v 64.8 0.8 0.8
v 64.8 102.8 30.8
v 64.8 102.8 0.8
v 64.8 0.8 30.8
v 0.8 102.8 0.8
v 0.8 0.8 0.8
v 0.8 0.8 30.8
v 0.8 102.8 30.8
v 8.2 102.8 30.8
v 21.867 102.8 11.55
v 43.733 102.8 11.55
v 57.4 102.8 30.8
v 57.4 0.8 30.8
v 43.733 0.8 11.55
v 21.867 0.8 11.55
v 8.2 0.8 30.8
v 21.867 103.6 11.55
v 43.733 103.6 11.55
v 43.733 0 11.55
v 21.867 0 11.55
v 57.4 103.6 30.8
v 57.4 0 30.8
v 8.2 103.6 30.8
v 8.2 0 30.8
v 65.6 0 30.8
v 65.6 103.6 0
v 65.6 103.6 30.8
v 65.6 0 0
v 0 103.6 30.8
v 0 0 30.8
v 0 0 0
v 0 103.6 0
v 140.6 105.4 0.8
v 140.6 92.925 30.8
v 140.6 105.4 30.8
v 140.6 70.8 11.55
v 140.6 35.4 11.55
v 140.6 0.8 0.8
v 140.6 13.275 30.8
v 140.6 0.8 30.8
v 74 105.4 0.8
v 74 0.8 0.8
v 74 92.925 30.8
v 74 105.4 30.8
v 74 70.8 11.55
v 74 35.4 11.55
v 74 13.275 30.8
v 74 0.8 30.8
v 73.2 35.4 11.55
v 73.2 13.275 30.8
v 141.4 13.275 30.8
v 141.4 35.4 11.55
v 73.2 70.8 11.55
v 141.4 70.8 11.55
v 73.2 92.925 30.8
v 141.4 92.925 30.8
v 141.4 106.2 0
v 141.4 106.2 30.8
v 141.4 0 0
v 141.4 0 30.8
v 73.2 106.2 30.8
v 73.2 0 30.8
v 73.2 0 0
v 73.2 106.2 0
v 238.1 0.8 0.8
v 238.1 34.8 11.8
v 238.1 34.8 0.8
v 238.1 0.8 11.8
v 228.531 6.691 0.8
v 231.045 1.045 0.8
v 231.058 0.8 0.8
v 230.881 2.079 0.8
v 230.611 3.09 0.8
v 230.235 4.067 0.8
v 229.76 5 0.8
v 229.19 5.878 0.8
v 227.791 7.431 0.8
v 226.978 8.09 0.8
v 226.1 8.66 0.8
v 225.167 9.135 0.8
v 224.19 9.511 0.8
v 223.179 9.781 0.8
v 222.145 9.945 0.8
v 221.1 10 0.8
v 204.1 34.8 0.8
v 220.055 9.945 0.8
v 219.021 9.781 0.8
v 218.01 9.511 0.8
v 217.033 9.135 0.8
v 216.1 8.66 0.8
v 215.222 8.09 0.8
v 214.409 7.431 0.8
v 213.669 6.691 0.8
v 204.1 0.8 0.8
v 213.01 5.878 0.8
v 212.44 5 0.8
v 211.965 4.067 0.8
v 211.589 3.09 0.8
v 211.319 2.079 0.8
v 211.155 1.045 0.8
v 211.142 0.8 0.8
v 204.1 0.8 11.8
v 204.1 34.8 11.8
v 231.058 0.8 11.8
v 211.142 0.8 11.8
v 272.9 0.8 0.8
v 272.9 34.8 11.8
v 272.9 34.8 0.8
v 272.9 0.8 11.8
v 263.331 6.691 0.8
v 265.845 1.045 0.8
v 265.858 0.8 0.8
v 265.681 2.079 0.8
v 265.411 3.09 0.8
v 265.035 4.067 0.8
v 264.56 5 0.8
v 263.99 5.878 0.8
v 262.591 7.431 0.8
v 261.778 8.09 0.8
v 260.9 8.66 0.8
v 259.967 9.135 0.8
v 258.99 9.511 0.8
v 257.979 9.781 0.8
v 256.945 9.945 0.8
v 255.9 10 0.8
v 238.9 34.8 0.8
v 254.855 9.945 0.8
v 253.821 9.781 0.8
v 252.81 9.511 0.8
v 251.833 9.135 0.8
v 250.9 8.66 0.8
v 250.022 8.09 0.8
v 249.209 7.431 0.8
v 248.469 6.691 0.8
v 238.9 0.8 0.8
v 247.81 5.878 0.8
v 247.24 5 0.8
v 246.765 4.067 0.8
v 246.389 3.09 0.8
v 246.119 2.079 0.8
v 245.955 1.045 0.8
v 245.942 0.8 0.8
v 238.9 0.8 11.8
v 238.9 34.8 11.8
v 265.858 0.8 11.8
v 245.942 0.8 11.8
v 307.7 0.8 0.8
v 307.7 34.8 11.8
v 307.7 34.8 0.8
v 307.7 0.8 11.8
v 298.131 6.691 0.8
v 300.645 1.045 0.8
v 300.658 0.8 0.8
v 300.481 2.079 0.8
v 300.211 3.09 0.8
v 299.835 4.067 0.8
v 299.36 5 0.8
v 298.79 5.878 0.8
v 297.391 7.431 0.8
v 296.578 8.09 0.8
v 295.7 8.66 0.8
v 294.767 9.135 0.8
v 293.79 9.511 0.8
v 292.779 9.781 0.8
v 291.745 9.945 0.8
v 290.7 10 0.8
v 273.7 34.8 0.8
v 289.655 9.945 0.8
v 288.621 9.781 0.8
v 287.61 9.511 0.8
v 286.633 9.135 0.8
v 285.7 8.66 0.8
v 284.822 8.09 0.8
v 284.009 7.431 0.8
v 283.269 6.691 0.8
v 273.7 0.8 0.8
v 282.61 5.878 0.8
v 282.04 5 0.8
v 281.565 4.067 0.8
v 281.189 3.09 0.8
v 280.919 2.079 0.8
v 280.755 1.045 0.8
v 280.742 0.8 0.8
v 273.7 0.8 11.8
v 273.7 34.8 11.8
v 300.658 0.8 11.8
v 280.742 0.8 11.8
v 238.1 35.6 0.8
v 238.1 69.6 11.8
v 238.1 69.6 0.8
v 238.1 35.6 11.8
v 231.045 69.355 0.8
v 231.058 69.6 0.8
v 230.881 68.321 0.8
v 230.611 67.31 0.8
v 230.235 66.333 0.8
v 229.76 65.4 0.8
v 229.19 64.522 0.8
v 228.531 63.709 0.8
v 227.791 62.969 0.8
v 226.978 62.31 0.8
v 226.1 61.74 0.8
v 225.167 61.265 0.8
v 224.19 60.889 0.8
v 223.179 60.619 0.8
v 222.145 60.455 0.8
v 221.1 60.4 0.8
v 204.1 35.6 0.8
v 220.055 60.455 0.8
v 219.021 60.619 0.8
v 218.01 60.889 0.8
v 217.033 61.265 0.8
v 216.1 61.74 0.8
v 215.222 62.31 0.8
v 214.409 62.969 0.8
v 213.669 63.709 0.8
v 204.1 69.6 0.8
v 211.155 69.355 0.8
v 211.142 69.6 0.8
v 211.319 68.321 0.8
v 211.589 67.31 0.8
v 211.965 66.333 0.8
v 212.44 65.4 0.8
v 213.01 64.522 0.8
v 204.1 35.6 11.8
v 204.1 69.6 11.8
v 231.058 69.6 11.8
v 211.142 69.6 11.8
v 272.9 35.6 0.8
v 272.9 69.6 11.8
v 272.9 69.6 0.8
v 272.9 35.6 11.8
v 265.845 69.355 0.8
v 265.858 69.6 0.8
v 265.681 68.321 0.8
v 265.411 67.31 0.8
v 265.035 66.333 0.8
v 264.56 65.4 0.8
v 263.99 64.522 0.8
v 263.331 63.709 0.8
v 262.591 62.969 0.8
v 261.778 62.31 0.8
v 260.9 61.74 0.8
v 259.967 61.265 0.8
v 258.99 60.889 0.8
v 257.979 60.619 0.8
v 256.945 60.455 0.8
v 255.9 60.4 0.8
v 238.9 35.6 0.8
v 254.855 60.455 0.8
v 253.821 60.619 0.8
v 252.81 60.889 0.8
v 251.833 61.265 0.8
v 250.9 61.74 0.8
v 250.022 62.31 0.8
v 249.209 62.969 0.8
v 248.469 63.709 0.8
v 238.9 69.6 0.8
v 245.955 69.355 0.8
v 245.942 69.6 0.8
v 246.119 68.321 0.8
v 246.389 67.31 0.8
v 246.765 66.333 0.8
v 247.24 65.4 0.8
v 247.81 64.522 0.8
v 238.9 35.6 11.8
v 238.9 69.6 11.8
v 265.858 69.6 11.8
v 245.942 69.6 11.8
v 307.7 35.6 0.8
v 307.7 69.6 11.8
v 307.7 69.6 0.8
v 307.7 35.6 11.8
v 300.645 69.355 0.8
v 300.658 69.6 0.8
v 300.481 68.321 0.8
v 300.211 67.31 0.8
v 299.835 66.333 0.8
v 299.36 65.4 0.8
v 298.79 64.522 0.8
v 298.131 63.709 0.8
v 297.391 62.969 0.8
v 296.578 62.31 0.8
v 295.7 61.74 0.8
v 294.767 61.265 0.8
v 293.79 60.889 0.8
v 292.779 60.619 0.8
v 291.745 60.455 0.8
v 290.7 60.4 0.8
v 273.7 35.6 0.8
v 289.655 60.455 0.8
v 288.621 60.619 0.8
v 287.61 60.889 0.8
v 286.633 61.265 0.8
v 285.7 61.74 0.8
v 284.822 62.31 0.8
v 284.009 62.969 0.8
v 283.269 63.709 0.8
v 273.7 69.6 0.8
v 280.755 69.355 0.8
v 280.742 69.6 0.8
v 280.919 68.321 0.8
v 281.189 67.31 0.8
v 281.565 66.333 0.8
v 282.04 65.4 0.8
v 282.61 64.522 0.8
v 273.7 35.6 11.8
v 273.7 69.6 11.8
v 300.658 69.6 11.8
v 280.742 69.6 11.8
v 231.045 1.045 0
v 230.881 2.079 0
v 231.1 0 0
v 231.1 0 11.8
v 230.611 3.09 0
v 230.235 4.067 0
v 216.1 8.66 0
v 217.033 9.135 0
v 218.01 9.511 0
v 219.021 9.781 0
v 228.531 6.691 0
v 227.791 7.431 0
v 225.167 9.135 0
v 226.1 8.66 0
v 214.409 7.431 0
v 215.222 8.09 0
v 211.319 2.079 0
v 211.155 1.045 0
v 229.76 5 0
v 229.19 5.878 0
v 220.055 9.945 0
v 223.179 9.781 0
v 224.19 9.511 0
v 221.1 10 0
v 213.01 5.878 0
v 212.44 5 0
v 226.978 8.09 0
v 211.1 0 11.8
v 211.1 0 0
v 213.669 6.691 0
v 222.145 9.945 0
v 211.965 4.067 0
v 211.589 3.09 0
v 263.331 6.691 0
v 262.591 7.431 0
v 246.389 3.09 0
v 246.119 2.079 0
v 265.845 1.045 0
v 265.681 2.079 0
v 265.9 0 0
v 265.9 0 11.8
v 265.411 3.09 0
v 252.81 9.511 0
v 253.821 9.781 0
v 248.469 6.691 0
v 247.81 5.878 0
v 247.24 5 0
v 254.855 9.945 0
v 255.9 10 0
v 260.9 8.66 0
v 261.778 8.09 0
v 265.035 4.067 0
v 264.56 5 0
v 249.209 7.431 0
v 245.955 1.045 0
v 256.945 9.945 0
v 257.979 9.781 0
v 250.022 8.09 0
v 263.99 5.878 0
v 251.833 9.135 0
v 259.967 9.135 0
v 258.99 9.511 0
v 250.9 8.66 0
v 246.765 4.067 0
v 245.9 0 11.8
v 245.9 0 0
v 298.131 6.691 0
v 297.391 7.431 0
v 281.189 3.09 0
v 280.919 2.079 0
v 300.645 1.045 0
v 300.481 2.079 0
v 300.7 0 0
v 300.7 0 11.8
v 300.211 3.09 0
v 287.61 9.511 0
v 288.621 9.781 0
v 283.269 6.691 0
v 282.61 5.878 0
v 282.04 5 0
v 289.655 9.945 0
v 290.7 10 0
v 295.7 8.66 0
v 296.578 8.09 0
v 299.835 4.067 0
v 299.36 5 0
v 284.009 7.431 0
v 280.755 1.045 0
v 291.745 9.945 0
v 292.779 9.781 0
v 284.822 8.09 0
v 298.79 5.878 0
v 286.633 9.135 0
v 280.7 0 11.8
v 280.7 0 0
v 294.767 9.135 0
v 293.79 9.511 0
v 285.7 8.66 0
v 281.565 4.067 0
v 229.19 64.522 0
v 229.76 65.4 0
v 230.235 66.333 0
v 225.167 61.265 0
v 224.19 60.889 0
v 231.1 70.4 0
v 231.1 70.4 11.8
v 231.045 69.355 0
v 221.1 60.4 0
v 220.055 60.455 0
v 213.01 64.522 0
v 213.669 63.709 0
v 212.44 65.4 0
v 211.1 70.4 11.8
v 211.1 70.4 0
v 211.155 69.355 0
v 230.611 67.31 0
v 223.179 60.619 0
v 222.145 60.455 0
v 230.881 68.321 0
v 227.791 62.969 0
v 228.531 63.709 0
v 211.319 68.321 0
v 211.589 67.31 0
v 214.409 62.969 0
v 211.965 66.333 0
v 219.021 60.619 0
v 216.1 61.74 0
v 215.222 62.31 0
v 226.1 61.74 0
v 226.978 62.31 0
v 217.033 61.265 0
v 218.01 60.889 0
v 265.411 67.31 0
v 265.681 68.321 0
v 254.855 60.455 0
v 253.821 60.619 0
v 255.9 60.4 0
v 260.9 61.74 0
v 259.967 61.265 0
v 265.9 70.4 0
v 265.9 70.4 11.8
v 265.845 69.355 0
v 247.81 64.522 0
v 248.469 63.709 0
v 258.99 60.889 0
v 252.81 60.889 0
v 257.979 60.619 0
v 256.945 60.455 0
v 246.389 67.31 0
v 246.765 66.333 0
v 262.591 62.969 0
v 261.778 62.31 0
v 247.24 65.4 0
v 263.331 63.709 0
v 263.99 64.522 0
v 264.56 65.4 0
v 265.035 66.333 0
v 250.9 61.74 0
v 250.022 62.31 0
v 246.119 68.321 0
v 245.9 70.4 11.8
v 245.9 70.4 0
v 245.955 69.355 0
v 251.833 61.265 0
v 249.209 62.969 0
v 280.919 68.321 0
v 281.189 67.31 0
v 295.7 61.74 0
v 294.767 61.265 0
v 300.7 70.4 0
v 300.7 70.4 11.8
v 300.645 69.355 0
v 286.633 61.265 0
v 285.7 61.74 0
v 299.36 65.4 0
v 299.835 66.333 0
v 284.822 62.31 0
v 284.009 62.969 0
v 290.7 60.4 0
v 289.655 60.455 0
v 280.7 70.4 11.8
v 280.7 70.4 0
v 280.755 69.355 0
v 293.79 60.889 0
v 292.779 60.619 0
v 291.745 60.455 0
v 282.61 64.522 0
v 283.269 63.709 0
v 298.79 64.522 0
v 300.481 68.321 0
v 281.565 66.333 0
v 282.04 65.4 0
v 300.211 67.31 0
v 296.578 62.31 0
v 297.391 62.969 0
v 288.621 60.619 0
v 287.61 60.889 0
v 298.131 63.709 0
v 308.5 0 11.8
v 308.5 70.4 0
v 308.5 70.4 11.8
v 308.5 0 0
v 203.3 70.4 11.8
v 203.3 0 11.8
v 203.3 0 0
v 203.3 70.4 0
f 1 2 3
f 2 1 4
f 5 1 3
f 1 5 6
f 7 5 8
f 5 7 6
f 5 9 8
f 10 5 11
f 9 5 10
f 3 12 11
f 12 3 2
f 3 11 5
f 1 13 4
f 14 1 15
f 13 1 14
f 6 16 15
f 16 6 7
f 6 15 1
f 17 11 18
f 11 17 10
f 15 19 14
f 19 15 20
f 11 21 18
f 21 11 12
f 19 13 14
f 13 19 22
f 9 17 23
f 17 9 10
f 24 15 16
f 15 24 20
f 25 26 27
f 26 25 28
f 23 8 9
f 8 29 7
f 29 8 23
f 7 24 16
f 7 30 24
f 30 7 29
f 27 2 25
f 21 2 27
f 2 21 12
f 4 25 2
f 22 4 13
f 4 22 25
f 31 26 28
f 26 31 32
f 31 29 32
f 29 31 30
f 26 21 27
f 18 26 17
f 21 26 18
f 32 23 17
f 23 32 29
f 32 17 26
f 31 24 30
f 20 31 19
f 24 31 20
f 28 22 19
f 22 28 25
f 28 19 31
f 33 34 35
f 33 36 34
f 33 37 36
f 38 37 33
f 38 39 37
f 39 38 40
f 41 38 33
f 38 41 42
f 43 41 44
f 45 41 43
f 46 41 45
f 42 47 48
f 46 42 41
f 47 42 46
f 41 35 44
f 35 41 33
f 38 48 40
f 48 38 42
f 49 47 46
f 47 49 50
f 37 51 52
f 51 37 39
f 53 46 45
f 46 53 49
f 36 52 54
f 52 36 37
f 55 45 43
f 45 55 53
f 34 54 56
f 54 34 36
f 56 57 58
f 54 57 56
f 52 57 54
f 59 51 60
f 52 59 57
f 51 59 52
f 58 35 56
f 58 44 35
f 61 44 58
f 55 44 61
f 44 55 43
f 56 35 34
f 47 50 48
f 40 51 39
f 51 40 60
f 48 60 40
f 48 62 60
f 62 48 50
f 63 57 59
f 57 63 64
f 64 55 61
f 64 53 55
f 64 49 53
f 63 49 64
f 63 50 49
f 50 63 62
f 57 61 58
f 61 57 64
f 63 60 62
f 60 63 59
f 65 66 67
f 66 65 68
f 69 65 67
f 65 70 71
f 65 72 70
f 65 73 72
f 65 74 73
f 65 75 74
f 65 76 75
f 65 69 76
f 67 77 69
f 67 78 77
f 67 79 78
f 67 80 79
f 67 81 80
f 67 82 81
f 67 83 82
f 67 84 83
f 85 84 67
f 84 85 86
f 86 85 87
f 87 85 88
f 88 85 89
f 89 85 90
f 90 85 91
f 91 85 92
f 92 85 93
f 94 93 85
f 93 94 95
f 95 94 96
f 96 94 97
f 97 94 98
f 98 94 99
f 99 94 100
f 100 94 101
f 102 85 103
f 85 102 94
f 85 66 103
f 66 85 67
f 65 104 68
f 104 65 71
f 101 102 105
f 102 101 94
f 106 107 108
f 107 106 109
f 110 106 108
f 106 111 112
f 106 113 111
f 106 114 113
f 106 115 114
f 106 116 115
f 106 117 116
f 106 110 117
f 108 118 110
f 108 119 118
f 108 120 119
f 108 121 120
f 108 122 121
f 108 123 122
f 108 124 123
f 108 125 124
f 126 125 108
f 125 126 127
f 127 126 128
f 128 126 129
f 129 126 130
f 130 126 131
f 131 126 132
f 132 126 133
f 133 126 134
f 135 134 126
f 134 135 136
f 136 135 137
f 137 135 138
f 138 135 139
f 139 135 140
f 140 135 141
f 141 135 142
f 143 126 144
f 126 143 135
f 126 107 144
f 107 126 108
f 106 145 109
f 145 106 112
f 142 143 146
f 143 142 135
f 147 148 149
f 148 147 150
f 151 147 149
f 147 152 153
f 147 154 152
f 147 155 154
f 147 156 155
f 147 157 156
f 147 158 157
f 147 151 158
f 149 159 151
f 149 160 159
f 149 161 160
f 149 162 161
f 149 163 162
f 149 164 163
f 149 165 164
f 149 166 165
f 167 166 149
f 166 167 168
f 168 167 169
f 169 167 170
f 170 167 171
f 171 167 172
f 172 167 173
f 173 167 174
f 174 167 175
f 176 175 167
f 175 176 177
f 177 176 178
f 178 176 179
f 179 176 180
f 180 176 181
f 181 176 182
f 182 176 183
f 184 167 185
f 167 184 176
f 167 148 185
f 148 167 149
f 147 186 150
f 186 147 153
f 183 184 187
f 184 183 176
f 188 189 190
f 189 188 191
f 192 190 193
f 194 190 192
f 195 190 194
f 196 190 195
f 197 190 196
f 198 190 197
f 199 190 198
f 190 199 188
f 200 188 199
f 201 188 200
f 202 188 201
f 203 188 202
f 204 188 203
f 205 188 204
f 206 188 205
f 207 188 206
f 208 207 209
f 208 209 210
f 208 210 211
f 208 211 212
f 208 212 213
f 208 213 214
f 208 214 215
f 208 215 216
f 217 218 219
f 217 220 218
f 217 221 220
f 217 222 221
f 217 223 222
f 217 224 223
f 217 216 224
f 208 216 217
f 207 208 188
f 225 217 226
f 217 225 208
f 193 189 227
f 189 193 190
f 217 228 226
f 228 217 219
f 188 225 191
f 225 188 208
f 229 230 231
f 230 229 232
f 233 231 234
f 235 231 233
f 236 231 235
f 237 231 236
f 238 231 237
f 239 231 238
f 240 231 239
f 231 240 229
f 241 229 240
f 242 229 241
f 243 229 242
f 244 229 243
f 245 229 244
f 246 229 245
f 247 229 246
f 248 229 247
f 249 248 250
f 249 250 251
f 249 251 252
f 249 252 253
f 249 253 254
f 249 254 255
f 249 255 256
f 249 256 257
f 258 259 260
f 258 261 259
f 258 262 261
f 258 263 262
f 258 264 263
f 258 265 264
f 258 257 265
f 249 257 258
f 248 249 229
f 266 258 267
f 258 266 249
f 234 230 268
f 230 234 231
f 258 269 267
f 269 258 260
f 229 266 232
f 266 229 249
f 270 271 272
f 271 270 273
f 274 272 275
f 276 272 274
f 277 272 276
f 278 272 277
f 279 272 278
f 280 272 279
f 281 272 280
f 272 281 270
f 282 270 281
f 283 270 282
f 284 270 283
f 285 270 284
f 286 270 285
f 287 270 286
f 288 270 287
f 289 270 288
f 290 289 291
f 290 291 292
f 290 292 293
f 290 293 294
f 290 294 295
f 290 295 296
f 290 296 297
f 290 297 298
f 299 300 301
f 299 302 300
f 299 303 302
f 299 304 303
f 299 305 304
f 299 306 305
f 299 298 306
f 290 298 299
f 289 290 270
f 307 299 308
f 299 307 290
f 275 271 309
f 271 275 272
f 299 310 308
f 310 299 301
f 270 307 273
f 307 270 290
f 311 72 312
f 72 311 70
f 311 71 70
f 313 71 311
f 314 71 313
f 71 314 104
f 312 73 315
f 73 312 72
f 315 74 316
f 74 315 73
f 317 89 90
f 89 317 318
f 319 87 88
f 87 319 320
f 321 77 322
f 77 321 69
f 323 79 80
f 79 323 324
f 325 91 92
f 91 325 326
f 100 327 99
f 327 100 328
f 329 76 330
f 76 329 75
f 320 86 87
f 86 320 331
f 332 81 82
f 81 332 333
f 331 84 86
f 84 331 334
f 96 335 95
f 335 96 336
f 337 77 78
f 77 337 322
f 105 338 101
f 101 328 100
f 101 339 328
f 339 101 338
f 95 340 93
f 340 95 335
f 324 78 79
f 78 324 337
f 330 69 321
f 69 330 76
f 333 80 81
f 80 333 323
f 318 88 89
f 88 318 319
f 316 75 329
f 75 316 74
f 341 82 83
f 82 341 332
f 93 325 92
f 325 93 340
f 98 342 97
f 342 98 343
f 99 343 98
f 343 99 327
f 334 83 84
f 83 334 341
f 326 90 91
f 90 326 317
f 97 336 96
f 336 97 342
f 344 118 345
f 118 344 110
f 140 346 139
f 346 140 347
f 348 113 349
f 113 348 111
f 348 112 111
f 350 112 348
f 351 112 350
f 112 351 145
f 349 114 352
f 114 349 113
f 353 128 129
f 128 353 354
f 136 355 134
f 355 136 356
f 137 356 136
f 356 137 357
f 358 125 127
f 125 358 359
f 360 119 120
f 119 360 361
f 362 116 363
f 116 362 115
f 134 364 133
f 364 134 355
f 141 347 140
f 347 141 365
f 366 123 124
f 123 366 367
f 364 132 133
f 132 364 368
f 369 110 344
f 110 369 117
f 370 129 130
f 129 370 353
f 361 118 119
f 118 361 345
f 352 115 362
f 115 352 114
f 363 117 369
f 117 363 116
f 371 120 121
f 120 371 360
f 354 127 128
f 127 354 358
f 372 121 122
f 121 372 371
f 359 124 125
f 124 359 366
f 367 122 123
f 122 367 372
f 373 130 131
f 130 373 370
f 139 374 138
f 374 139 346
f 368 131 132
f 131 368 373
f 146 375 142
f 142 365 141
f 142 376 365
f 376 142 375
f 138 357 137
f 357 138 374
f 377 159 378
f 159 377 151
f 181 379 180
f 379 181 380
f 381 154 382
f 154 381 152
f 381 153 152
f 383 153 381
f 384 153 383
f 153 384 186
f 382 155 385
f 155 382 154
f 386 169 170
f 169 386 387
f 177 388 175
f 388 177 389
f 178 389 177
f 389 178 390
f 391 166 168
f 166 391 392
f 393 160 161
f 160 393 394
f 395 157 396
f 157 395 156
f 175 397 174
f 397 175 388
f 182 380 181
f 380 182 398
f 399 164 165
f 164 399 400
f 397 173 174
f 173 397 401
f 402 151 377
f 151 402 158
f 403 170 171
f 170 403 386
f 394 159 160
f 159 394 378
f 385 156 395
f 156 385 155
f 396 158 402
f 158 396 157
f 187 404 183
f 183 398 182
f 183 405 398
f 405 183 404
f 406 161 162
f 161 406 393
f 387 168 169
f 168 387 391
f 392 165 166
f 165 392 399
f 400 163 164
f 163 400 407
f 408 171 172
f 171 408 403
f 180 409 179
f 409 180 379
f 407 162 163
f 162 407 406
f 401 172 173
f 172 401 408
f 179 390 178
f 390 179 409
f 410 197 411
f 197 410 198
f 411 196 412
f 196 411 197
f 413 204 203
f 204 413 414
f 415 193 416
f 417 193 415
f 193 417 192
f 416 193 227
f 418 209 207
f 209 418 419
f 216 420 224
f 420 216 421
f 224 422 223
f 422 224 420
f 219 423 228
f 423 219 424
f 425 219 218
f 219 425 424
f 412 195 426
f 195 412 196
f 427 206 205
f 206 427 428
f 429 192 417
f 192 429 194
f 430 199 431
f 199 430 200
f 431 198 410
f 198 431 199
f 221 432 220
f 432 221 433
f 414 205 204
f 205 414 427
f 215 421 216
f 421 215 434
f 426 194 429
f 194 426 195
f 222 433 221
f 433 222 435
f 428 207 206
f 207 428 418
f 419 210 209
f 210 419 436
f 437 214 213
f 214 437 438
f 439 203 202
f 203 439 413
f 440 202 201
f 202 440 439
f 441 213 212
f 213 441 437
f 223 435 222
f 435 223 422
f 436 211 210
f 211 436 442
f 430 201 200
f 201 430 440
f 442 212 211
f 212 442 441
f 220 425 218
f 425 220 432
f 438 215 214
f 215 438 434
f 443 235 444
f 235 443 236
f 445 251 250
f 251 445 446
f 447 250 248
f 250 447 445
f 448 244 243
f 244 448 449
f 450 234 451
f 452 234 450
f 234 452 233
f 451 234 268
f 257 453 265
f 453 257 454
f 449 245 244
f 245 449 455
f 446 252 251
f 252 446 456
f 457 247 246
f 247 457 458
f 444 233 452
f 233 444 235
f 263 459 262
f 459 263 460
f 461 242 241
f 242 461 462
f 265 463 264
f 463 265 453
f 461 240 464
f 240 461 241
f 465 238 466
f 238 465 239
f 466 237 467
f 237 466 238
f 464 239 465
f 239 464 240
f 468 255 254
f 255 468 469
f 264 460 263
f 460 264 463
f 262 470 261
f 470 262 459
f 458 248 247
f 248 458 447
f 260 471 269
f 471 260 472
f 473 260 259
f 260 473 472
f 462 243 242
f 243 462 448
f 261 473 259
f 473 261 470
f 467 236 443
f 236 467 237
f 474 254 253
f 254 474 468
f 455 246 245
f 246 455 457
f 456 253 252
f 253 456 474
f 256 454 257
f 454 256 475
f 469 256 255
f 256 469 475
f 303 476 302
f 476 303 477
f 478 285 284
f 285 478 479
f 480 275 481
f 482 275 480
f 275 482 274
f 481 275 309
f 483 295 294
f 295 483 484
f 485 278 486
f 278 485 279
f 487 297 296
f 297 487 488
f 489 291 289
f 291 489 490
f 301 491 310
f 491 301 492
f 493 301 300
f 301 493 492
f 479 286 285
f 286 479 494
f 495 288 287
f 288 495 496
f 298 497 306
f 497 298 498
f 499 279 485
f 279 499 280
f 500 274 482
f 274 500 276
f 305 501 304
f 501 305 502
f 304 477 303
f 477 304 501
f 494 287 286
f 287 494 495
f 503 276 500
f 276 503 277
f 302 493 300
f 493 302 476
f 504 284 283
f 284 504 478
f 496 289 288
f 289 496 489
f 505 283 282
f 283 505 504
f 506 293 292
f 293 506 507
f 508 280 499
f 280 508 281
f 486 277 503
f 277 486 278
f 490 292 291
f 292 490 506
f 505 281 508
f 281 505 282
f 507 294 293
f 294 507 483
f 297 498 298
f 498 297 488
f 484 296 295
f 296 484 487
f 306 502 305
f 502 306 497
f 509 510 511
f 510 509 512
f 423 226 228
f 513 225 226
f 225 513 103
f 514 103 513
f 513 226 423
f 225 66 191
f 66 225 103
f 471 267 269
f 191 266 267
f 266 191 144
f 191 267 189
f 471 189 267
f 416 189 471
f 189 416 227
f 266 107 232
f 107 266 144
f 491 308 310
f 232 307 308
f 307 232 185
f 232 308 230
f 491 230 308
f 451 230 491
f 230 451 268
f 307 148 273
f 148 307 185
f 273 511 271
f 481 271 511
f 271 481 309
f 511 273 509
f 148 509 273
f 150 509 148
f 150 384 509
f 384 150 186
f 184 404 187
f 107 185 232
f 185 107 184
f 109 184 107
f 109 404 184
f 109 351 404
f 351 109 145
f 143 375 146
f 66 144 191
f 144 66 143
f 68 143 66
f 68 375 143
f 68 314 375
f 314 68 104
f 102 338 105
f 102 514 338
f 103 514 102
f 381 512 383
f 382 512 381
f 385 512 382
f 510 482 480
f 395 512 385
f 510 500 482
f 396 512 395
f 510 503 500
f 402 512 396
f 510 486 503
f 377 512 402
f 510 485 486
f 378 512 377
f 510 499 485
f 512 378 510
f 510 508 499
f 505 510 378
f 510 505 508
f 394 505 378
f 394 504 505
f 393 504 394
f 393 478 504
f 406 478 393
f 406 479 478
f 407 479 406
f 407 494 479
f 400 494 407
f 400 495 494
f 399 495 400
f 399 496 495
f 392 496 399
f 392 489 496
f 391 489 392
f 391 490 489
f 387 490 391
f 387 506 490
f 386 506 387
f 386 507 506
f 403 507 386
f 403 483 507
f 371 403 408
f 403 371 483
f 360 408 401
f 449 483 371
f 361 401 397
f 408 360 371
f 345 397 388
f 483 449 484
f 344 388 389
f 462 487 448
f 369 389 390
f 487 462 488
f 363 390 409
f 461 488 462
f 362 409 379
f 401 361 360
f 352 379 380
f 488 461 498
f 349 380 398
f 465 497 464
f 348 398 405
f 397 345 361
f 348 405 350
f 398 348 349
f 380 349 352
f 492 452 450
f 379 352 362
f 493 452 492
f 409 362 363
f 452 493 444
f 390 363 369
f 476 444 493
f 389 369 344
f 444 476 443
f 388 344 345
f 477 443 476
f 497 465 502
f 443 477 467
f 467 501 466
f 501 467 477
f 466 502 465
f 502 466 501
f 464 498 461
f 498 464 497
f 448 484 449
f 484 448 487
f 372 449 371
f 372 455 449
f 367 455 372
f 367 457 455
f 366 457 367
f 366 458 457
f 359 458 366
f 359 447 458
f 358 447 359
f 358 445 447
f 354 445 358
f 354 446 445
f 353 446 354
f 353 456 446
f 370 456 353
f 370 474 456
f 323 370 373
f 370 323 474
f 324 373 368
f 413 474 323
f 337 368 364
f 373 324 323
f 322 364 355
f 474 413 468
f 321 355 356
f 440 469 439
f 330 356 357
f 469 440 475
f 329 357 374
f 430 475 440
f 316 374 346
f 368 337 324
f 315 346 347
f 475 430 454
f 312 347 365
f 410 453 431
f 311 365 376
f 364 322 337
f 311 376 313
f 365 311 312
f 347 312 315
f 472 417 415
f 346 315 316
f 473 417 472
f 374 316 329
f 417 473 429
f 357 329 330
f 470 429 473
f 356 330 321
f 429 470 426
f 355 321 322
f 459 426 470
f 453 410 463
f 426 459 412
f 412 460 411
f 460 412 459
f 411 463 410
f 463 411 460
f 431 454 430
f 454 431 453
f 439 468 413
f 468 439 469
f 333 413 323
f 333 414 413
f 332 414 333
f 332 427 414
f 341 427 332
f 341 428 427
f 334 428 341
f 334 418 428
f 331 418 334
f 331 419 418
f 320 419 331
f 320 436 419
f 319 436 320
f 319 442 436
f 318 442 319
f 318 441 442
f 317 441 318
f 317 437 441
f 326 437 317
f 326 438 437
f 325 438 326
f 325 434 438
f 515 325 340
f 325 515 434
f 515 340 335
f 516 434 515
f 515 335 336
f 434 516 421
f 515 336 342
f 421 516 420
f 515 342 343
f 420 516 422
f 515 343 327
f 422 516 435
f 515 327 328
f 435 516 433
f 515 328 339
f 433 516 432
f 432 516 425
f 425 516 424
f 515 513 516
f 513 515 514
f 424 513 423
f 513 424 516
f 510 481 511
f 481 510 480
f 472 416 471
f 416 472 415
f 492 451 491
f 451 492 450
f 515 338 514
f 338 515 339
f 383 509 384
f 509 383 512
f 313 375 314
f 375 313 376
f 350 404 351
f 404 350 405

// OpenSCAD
// Maximim card width (default 64)
card_size_x = 64;

// Maximum card lenght (default 102)
card_size_y = 102;

// Maximum internal height (default 30)
height = 30;

// Thickness of the walls (default 1.75)
wall_thickness = 0.8;

// Separation between upper and lower (default 0.5)
tolerance = 0.5;

/* {{{ %%SECTION_HEADER%%
 * * * *
 * This header information is automatically generated by KodeUtils.
 *
 * File 'tarjetero.scad' edited by kwendenarmo, last modified: 2017-04-15.
 * This file is part of 'tarjetero' package, please see the readme files for more information about this file and this package.
 *
 * Copyright (C) 2017 by kwendenarmo <kwendenarmo@akornsys-rdi.net>
 * Released under the GNU GPLv3
 *
 *    This program is free software: you can redistribute it and/or modify
 *    it under the terms of the GNU General Public License as published by
 *    the Free Software Foundation, either version 3 of the License, or
 *    (at your option) any later version.
 *
 *    This program is distributed in the hope that it will be useful,
 *    but WITHOUT ANY WARRANTY; without even the implied warranty of
 *    MERCHANTABILITY or FITNESS FOR A PARTICULAR PURPOSE.  See the
 *    GNU General Public License for more details.
 *
 *    You should have received a copy of the GNU General Public License
 *    along with this program.  If not, see <http://www.gnu.org/licenses/>.
 *
 * * * *
 * %%EOS_HEADER%% }}}
 */

$fn=60;

//Standard case size 64x102x30

display="";
if (display=="") assembled();
if (display=="dixit_upper.stl") upper();
if (display=="dixit_lower.stl") lower();
if (display=="dixit_tokens.stl") vote_tokens();

module assembled() {
    lower();
    translate([card_size_x+(wall_thickness*2+tolerance)*2+5,0,0]) upper();
    translate([card_size_x*3+(wall_thickness*2+tolerance)*3+5,0,0]) vote_tokens();
}

pad=0.1;
token=34;
token_h=11;
outer_token_box=[token*3+wall_thickness*4,token*2+wall_thickness*3,token_h+wall_thickness];
token_box=[token,token,token_h+pad];
finger=20;
module vote_tokens() {
    difference() {
        cube(outer_token_box);
        for(y=[wall_thickness:token+wall_thickness:(token+wall_thickness)*2]) {
            for(x=[wall_thickness:token+wall_thickness:(token+wall_thickness)*3]) {
                translate([x,y,wall_thickness])
                cube(token_box);
            }
        }
        for(y=[0,token*2+wall_thickness*3]) {
            for(x=[wall_thickness+token/2:token+wall_thickness:(token+wall_thickness)*3]) {
                translate([x,y,-pad])
                cylinder(d=finger,h=token_h+wall_thickness+pad*2);
            }
        }
    }
}

module upper() {
    box_x=card_size_x+(wall_thickness*2+tolerance)*2;
    box_y=card_size_y+(wall_thickness*2+tolerance)*2;
    box_z=height+wall_thickness;
    inner_box_x=card_size_x+(wall_thickness+tolerance)*2;
    inner_box_y=card_size_y+(wall_thickness+tolerance)*2;

    difference() {
        union() {
            cube([box_x,box_y,box_z]);
        }
        union() {
            translate([wall_thickness,wall_thickness,wall_thickness]) cube([inner_box_x,inner_box_y,height+1]);
            translate([-1,box_y/3,(box_z/8)*3]) hull() {
                cube([box_x+2,box_y/3,1]);
                translate([0,-box_y/3+box_y/8,(box_z/8)*5]) cube([box_x+2,(box_y/8)*6,1]);
            }
        }
    }
}

module lower() {
    box_x=card_size_x+(wall_thickness)*2;
    box_y=card_size_y+(wall_thickness)*2;
    box_z=height+wall_thickness;

    difference() {
        union() {
            cube([box_x,box_y,box_z]);
        }
        union() {
            translate([wall_thickness,wall_thickness,wall_thickness]) cube([card_size_x,card_size_y,height+1]);
            translate([box_x/3,-1,(box_z/8)*3]) hull() {
                cube([box_x/3,box_y+2,1]);
                translate([-box_x/3+box_x/8,0,(box_z/8)*5]) cube([(box_x/8)*6,box_y+2,1]);
            }
        }
    }
}
